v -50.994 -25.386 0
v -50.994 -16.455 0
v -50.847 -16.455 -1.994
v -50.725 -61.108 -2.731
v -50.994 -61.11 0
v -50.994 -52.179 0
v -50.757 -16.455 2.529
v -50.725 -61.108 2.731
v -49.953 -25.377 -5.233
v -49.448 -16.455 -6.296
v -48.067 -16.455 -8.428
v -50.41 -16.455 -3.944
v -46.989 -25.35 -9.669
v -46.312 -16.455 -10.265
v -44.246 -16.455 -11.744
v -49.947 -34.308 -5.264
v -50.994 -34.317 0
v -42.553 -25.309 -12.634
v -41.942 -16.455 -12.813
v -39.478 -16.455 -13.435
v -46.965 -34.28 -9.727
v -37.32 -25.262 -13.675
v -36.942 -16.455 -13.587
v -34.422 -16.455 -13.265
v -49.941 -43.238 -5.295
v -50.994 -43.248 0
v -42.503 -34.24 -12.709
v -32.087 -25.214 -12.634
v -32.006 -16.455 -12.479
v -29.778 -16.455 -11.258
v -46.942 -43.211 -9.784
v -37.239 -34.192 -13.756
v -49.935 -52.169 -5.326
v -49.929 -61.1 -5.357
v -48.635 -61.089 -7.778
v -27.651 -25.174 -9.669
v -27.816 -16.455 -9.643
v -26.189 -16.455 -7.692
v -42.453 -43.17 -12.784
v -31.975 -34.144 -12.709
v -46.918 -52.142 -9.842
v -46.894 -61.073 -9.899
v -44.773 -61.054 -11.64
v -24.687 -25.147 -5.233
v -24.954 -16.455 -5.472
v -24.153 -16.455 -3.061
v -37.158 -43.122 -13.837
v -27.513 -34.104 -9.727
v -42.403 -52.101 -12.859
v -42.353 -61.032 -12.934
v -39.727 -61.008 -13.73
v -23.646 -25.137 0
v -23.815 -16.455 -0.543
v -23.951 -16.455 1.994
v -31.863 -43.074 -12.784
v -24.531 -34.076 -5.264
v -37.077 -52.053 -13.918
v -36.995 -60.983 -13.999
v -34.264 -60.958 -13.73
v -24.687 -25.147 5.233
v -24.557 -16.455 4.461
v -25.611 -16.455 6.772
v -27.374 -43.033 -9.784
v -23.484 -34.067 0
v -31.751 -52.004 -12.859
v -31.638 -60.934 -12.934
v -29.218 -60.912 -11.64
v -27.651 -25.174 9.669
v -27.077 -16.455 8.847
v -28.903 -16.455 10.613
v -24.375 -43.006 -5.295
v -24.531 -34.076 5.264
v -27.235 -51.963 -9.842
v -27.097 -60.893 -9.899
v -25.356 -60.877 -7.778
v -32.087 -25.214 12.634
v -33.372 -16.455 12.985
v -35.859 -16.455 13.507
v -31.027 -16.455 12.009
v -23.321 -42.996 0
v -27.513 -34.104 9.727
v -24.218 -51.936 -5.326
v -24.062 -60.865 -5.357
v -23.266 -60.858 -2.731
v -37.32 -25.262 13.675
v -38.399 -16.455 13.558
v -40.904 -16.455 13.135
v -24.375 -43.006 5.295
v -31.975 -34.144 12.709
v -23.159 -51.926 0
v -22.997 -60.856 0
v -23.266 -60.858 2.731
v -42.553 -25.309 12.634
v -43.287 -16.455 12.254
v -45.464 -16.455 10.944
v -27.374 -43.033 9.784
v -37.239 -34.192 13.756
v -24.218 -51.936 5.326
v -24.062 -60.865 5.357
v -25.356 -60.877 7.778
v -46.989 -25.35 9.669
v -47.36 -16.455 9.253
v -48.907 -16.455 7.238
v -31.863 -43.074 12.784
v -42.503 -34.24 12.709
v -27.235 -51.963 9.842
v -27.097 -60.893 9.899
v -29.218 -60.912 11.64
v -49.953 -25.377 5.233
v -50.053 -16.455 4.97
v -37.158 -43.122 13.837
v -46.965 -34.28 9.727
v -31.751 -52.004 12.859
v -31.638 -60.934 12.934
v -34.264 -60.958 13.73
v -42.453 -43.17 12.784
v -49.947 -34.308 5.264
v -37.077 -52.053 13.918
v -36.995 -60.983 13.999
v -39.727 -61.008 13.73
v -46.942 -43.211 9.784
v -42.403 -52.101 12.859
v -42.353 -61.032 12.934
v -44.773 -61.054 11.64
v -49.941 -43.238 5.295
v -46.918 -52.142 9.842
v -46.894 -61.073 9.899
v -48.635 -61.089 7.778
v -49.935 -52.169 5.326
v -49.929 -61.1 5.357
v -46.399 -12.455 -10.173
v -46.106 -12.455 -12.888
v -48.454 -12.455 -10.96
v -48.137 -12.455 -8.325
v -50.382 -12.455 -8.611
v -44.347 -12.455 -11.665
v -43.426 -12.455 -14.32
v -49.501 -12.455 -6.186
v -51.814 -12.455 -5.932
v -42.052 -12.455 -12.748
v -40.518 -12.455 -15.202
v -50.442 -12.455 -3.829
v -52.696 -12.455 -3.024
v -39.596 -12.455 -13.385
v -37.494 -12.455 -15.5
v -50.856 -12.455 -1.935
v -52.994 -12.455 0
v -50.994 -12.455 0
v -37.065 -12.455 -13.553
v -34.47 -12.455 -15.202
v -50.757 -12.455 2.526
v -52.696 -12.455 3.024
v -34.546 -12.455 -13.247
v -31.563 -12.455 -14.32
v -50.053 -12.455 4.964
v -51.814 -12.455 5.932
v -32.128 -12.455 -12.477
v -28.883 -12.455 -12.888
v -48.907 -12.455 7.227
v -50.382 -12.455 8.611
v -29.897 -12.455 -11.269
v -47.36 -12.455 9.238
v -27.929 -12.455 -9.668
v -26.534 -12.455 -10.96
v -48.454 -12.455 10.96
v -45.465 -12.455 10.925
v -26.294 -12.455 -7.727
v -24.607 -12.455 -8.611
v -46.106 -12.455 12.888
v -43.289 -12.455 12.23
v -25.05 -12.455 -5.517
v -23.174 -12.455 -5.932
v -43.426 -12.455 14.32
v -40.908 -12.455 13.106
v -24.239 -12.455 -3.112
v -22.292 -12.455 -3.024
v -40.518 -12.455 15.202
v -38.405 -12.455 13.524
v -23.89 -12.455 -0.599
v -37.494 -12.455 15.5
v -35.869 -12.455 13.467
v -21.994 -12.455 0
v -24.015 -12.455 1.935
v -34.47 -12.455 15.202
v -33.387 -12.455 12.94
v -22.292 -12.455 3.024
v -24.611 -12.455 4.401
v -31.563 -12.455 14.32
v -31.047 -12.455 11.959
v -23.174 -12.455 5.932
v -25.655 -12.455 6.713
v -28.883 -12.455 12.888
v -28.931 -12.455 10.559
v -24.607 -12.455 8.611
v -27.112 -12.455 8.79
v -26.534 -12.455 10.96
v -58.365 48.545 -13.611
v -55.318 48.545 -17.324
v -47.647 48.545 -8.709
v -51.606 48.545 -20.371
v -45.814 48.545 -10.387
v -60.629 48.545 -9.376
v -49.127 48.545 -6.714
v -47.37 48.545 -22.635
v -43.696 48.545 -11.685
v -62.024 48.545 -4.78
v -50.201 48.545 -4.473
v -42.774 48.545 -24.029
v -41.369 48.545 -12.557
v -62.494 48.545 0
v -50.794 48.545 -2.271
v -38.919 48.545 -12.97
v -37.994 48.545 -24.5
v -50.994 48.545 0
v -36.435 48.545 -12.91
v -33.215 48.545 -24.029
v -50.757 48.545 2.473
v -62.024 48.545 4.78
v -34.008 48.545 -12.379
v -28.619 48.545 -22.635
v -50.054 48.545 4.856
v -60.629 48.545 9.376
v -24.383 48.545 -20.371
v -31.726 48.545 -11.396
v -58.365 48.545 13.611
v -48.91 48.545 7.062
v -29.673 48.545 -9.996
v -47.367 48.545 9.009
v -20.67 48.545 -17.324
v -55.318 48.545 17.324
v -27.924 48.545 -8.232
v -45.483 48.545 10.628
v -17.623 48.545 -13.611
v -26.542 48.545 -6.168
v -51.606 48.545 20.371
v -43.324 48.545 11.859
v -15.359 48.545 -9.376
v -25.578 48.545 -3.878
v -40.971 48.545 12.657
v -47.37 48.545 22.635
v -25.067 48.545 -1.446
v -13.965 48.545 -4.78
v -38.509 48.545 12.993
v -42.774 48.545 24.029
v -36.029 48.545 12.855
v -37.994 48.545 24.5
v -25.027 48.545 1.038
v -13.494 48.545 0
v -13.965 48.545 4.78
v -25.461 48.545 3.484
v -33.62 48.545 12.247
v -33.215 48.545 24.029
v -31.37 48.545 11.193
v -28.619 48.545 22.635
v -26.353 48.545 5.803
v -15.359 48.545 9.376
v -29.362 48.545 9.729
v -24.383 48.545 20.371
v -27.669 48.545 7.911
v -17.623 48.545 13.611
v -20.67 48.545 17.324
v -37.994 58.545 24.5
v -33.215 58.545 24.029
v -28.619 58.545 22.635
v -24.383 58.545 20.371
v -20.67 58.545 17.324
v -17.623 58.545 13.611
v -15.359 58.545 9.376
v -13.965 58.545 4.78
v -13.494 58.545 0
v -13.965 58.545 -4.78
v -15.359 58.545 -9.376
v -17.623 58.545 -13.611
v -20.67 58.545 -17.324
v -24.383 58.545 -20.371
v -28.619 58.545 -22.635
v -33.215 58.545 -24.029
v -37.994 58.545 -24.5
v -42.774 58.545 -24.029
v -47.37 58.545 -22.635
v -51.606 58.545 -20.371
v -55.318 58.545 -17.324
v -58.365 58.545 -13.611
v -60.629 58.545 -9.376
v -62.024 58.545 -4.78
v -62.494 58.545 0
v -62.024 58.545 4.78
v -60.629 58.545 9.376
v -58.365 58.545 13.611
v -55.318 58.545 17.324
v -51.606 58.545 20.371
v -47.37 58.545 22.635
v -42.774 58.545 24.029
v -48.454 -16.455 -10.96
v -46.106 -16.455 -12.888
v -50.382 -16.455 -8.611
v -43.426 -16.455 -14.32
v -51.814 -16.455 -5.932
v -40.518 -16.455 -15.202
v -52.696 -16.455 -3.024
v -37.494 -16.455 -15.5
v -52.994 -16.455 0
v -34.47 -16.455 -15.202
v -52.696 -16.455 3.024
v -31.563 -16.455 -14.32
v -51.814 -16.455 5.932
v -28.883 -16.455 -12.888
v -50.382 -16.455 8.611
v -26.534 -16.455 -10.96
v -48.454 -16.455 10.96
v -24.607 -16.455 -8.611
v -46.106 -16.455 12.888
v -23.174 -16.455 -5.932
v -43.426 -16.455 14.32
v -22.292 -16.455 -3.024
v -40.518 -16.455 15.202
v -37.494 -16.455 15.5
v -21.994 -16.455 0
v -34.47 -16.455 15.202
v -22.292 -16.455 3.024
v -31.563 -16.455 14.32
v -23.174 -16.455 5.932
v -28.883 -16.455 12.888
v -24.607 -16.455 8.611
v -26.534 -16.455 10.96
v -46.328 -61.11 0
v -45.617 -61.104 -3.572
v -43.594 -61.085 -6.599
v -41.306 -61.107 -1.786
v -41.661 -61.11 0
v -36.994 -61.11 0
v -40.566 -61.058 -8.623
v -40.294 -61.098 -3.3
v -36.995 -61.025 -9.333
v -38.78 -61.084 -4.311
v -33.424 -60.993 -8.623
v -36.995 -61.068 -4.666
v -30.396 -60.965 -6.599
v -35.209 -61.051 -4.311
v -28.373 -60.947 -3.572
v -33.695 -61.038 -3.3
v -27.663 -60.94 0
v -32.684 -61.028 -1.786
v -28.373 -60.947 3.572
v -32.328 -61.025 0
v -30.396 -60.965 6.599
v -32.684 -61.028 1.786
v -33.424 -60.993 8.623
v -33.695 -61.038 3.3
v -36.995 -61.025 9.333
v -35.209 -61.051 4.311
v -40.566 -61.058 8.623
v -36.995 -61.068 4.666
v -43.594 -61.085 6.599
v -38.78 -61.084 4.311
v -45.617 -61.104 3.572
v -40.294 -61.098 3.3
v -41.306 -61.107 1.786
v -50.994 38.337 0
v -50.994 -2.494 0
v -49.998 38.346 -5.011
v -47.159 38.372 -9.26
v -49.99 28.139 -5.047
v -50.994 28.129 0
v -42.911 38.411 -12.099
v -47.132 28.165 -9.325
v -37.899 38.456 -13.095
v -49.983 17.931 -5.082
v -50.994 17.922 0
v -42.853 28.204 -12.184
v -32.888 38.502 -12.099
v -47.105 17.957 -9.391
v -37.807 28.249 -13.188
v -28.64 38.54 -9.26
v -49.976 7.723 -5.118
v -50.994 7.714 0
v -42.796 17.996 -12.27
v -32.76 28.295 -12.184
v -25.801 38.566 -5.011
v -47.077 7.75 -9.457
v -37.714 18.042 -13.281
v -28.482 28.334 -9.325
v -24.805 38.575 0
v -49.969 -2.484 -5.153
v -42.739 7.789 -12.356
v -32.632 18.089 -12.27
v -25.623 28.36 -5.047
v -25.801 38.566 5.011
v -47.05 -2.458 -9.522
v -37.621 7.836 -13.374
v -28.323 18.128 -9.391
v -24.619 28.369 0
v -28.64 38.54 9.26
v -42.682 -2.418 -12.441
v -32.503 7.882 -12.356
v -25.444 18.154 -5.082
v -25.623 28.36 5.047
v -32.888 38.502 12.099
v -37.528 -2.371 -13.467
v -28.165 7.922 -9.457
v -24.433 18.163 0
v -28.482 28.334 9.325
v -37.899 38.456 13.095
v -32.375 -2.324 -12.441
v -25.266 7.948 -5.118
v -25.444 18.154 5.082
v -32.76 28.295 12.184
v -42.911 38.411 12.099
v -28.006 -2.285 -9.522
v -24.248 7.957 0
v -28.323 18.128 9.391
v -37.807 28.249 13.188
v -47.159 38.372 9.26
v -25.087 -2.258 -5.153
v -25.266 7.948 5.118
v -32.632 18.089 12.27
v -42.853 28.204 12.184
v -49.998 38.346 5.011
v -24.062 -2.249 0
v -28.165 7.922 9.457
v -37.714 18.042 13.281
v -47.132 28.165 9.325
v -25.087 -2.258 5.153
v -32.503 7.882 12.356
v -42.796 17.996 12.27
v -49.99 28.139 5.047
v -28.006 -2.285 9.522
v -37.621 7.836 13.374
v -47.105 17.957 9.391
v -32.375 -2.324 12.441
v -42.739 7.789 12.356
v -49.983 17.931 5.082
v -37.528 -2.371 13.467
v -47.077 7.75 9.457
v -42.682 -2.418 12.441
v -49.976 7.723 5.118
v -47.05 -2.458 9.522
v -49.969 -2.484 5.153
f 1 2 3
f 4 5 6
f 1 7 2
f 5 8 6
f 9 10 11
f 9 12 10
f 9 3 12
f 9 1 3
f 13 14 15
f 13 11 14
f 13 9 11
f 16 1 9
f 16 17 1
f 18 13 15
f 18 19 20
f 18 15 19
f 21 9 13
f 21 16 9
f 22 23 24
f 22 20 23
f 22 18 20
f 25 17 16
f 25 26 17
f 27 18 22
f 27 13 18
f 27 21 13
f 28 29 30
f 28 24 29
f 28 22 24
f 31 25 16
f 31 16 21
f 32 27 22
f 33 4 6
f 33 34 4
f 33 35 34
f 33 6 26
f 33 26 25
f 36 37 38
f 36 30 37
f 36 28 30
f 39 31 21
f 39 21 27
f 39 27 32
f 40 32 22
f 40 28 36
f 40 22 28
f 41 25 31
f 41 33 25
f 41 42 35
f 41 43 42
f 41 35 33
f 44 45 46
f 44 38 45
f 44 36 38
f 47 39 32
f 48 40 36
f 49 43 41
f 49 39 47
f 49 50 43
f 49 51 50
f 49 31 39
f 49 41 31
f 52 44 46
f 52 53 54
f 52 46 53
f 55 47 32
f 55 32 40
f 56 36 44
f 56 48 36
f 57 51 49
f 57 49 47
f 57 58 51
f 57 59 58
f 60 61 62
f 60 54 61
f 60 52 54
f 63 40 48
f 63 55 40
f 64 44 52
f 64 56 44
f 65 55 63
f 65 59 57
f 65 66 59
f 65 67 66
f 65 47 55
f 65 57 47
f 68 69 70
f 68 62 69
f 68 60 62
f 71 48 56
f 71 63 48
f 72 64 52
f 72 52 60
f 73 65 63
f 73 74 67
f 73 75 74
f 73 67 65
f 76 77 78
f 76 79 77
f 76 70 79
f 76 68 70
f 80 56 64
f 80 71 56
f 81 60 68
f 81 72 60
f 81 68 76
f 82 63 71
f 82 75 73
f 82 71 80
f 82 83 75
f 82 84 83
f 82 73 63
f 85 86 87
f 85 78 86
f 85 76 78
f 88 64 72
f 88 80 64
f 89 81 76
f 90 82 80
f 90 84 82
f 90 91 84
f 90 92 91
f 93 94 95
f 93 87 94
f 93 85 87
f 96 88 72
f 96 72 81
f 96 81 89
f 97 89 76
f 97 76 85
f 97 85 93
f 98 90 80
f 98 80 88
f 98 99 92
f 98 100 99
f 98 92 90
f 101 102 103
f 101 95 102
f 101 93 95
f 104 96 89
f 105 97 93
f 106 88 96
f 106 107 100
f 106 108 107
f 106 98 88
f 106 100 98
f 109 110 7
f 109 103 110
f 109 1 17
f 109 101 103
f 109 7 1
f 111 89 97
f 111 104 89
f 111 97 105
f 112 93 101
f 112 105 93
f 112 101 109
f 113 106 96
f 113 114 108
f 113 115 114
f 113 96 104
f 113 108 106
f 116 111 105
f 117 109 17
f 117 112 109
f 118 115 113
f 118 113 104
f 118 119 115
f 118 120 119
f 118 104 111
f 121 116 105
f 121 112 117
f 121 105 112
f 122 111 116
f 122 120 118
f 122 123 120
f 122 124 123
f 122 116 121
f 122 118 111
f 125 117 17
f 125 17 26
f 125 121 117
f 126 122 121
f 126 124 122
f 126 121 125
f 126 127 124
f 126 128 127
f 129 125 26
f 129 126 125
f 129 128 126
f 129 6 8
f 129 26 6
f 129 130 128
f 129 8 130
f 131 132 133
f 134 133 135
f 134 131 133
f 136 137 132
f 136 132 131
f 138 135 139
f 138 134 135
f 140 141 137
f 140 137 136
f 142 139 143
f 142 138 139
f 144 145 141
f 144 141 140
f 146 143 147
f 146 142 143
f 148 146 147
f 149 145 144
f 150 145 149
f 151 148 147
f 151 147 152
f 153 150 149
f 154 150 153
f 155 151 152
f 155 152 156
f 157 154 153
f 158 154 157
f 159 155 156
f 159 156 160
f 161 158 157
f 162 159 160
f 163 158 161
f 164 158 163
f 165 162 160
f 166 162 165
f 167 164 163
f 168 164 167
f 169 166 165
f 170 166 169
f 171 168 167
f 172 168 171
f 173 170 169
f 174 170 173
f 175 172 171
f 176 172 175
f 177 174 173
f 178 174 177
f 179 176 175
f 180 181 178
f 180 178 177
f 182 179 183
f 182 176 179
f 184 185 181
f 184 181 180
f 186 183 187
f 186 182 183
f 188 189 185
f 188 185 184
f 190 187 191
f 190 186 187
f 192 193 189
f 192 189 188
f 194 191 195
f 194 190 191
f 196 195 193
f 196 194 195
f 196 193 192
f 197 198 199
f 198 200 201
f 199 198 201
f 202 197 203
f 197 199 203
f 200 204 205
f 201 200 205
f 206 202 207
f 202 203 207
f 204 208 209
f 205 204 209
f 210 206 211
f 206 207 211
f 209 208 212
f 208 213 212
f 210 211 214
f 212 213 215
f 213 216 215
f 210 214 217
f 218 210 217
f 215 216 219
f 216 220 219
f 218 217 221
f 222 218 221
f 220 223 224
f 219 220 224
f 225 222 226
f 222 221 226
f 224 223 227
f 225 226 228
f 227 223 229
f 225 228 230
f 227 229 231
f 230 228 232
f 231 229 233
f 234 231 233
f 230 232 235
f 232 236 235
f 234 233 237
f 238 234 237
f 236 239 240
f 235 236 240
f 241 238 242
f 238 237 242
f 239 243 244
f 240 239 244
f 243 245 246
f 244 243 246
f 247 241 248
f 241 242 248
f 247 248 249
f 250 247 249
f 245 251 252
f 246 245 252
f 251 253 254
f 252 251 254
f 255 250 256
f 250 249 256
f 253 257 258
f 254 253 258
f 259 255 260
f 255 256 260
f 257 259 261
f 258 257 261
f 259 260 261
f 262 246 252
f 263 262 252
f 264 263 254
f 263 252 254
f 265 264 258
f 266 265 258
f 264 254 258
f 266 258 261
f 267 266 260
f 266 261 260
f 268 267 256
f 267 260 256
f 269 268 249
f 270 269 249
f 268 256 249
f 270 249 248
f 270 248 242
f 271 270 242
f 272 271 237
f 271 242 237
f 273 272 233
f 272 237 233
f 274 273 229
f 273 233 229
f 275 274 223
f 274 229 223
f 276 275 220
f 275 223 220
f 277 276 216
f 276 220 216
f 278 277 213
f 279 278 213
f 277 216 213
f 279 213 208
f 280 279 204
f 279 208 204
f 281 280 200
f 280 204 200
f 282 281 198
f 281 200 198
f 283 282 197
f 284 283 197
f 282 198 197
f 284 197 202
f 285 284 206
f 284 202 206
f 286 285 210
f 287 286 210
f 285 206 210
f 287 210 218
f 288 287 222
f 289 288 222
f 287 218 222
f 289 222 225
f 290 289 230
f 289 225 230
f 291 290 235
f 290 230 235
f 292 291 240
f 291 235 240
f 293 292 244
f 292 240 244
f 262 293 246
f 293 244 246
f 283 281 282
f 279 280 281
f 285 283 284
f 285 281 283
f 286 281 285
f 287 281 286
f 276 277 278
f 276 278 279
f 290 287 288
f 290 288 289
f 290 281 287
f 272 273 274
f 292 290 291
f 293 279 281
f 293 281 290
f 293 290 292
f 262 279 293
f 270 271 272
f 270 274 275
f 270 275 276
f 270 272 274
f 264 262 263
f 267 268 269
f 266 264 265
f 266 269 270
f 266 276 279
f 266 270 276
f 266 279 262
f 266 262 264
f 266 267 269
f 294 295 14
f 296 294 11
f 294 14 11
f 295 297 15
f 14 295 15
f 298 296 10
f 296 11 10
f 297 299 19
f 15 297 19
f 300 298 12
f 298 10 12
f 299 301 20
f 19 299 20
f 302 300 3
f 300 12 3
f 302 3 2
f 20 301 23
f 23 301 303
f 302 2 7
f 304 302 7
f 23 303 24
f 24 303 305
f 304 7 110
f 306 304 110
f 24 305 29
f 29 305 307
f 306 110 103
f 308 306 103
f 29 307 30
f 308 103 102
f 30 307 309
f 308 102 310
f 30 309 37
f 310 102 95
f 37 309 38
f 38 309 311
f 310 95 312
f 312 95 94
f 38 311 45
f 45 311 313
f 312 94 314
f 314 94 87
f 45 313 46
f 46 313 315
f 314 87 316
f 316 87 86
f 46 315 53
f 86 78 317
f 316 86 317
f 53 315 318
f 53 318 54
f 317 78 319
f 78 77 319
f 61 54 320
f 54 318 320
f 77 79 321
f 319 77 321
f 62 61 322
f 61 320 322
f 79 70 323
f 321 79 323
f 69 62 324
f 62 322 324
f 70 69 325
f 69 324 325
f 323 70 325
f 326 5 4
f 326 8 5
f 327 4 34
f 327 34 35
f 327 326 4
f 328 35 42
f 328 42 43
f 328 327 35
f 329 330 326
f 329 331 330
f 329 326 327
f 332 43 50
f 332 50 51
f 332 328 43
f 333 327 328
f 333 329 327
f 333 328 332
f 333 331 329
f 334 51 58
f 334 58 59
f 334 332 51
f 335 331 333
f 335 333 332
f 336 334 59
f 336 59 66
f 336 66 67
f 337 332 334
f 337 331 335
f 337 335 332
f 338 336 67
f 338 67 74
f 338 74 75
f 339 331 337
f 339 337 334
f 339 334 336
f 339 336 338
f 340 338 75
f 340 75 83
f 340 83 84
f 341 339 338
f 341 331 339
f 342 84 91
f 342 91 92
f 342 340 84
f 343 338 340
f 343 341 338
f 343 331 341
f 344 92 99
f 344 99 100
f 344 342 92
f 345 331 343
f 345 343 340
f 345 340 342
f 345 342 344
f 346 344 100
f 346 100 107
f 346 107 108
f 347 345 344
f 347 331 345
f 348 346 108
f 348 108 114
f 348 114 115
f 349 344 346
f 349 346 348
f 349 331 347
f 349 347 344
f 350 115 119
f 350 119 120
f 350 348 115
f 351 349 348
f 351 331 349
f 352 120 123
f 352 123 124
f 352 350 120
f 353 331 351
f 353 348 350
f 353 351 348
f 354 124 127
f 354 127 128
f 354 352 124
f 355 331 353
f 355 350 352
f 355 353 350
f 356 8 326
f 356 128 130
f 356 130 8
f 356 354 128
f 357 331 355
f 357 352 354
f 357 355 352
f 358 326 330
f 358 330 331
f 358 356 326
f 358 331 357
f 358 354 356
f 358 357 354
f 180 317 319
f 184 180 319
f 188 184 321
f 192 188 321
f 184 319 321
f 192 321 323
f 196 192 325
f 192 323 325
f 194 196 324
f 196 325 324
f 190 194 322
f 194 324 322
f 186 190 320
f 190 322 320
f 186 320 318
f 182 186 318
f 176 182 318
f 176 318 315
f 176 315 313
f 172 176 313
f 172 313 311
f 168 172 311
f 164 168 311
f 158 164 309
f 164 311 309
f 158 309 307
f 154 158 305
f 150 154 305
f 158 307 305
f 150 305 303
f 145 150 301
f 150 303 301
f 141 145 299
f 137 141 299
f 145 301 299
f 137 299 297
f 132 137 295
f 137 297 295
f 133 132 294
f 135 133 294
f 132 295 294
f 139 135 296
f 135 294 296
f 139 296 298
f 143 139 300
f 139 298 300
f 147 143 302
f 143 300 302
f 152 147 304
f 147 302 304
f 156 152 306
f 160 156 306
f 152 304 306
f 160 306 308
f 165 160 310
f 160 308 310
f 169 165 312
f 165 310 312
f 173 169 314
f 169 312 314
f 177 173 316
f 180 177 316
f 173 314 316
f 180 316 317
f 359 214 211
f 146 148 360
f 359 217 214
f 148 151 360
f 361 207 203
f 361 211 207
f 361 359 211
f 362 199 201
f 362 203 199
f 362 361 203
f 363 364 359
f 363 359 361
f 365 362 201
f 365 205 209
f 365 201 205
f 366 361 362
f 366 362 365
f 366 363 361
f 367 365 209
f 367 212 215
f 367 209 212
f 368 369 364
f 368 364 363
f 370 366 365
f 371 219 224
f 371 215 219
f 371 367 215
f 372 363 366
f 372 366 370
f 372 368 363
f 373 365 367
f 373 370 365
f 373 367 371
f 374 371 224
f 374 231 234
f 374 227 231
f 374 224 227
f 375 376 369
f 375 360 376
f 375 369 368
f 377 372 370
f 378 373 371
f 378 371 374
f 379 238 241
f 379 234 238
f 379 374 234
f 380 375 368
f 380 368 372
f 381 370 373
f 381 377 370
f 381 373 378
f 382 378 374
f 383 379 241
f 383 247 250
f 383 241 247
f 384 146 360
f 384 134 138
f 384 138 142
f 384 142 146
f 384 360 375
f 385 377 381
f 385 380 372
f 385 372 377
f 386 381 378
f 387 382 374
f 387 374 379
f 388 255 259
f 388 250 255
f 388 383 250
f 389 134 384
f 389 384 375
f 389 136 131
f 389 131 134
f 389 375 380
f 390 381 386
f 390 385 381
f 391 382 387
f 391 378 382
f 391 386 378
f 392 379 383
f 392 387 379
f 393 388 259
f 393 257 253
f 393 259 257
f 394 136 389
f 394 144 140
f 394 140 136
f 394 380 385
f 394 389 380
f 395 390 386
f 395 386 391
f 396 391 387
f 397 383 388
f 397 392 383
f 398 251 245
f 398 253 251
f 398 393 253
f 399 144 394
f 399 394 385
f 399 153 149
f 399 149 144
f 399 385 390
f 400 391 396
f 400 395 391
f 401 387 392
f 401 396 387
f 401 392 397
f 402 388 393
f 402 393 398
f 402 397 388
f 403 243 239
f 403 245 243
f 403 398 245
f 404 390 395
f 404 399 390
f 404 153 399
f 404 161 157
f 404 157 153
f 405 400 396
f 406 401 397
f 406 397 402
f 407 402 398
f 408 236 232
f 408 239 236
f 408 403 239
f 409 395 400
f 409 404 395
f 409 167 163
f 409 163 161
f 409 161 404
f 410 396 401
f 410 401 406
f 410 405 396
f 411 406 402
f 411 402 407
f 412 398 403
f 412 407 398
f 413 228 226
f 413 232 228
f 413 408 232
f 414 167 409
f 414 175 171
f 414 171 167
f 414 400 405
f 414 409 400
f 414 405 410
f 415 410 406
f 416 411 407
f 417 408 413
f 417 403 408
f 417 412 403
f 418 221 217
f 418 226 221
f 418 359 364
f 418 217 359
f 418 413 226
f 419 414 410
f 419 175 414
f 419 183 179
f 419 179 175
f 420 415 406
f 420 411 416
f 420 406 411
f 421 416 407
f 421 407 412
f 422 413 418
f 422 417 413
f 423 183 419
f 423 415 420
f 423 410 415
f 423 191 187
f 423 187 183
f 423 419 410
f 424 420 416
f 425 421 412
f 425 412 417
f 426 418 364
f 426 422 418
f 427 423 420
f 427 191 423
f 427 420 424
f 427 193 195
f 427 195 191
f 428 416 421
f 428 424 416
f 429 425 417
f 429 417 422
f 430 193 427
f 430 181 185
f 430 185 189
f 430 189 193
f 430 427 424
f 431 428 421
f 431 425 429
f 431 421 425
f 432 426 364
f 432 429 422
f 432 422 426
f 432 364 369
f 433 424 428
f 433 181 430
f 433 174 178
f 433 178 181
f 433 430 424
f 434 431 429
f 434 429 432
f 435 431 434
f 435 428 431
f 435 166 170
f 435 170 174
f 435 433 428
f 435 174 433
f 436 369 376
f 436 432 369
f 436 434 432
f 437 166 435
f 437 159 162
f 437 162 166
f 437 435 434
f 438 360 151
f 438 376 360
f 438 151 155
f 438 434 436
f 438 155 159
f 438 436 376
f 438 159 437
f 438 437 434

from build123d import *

# Parameters (mm, degrees)
SKETCH3_R           = 24.5
BOSS_EXTRUDE1_DEPTH = 10
SKETCH4_R           = 15.5
BOSS_EXTRUDE3_DEPTH = 4


with BuildPart() as part:
    # Sketch1 → Revolve1 (revolve)
    with BuildSketch(Plane.XY):
        Polygon((-50.994307358, 48.889927559), (-50.994307358, -61.110072441), (-36.994307358, -61.110072441), (-37.994307358, 48.889927559), align=None)
    revolve(axis=Axis((-37.994307358, 48.889927559, 0), (0.009090533456791595, -0.9999586802470746, 0)))

    # Sketch3 → Boss-Extrude1 (add)
    with BuildSketch(Plane(origin=(0, 48.544964037, 0), x_dir=(1, 0, 0), z_dir=(0, 1, 0))):
        with Locations(Location((-37.994307358, 0, 0), (0, 0, 270))):
            Circle(SKETCH3_R)
    extrude(amount=BOSS_EXTRUDE1_DEPTH)

    # Sketch4 → Boss-Extrude3 (add)
    with BuildSketch(Plane(origin=(0, -16.455035963, 0), x_dir=(1, 0, 0), z_dir=(0, 1, 0))):
        with Locations(Location((-37.494307358, 0, 0), (0, 0, 270))):
            Circle(SKETCH4_R)
    extrude(amount=BOSS_EXTRUDE3_DEPTH)


solid = part.part
